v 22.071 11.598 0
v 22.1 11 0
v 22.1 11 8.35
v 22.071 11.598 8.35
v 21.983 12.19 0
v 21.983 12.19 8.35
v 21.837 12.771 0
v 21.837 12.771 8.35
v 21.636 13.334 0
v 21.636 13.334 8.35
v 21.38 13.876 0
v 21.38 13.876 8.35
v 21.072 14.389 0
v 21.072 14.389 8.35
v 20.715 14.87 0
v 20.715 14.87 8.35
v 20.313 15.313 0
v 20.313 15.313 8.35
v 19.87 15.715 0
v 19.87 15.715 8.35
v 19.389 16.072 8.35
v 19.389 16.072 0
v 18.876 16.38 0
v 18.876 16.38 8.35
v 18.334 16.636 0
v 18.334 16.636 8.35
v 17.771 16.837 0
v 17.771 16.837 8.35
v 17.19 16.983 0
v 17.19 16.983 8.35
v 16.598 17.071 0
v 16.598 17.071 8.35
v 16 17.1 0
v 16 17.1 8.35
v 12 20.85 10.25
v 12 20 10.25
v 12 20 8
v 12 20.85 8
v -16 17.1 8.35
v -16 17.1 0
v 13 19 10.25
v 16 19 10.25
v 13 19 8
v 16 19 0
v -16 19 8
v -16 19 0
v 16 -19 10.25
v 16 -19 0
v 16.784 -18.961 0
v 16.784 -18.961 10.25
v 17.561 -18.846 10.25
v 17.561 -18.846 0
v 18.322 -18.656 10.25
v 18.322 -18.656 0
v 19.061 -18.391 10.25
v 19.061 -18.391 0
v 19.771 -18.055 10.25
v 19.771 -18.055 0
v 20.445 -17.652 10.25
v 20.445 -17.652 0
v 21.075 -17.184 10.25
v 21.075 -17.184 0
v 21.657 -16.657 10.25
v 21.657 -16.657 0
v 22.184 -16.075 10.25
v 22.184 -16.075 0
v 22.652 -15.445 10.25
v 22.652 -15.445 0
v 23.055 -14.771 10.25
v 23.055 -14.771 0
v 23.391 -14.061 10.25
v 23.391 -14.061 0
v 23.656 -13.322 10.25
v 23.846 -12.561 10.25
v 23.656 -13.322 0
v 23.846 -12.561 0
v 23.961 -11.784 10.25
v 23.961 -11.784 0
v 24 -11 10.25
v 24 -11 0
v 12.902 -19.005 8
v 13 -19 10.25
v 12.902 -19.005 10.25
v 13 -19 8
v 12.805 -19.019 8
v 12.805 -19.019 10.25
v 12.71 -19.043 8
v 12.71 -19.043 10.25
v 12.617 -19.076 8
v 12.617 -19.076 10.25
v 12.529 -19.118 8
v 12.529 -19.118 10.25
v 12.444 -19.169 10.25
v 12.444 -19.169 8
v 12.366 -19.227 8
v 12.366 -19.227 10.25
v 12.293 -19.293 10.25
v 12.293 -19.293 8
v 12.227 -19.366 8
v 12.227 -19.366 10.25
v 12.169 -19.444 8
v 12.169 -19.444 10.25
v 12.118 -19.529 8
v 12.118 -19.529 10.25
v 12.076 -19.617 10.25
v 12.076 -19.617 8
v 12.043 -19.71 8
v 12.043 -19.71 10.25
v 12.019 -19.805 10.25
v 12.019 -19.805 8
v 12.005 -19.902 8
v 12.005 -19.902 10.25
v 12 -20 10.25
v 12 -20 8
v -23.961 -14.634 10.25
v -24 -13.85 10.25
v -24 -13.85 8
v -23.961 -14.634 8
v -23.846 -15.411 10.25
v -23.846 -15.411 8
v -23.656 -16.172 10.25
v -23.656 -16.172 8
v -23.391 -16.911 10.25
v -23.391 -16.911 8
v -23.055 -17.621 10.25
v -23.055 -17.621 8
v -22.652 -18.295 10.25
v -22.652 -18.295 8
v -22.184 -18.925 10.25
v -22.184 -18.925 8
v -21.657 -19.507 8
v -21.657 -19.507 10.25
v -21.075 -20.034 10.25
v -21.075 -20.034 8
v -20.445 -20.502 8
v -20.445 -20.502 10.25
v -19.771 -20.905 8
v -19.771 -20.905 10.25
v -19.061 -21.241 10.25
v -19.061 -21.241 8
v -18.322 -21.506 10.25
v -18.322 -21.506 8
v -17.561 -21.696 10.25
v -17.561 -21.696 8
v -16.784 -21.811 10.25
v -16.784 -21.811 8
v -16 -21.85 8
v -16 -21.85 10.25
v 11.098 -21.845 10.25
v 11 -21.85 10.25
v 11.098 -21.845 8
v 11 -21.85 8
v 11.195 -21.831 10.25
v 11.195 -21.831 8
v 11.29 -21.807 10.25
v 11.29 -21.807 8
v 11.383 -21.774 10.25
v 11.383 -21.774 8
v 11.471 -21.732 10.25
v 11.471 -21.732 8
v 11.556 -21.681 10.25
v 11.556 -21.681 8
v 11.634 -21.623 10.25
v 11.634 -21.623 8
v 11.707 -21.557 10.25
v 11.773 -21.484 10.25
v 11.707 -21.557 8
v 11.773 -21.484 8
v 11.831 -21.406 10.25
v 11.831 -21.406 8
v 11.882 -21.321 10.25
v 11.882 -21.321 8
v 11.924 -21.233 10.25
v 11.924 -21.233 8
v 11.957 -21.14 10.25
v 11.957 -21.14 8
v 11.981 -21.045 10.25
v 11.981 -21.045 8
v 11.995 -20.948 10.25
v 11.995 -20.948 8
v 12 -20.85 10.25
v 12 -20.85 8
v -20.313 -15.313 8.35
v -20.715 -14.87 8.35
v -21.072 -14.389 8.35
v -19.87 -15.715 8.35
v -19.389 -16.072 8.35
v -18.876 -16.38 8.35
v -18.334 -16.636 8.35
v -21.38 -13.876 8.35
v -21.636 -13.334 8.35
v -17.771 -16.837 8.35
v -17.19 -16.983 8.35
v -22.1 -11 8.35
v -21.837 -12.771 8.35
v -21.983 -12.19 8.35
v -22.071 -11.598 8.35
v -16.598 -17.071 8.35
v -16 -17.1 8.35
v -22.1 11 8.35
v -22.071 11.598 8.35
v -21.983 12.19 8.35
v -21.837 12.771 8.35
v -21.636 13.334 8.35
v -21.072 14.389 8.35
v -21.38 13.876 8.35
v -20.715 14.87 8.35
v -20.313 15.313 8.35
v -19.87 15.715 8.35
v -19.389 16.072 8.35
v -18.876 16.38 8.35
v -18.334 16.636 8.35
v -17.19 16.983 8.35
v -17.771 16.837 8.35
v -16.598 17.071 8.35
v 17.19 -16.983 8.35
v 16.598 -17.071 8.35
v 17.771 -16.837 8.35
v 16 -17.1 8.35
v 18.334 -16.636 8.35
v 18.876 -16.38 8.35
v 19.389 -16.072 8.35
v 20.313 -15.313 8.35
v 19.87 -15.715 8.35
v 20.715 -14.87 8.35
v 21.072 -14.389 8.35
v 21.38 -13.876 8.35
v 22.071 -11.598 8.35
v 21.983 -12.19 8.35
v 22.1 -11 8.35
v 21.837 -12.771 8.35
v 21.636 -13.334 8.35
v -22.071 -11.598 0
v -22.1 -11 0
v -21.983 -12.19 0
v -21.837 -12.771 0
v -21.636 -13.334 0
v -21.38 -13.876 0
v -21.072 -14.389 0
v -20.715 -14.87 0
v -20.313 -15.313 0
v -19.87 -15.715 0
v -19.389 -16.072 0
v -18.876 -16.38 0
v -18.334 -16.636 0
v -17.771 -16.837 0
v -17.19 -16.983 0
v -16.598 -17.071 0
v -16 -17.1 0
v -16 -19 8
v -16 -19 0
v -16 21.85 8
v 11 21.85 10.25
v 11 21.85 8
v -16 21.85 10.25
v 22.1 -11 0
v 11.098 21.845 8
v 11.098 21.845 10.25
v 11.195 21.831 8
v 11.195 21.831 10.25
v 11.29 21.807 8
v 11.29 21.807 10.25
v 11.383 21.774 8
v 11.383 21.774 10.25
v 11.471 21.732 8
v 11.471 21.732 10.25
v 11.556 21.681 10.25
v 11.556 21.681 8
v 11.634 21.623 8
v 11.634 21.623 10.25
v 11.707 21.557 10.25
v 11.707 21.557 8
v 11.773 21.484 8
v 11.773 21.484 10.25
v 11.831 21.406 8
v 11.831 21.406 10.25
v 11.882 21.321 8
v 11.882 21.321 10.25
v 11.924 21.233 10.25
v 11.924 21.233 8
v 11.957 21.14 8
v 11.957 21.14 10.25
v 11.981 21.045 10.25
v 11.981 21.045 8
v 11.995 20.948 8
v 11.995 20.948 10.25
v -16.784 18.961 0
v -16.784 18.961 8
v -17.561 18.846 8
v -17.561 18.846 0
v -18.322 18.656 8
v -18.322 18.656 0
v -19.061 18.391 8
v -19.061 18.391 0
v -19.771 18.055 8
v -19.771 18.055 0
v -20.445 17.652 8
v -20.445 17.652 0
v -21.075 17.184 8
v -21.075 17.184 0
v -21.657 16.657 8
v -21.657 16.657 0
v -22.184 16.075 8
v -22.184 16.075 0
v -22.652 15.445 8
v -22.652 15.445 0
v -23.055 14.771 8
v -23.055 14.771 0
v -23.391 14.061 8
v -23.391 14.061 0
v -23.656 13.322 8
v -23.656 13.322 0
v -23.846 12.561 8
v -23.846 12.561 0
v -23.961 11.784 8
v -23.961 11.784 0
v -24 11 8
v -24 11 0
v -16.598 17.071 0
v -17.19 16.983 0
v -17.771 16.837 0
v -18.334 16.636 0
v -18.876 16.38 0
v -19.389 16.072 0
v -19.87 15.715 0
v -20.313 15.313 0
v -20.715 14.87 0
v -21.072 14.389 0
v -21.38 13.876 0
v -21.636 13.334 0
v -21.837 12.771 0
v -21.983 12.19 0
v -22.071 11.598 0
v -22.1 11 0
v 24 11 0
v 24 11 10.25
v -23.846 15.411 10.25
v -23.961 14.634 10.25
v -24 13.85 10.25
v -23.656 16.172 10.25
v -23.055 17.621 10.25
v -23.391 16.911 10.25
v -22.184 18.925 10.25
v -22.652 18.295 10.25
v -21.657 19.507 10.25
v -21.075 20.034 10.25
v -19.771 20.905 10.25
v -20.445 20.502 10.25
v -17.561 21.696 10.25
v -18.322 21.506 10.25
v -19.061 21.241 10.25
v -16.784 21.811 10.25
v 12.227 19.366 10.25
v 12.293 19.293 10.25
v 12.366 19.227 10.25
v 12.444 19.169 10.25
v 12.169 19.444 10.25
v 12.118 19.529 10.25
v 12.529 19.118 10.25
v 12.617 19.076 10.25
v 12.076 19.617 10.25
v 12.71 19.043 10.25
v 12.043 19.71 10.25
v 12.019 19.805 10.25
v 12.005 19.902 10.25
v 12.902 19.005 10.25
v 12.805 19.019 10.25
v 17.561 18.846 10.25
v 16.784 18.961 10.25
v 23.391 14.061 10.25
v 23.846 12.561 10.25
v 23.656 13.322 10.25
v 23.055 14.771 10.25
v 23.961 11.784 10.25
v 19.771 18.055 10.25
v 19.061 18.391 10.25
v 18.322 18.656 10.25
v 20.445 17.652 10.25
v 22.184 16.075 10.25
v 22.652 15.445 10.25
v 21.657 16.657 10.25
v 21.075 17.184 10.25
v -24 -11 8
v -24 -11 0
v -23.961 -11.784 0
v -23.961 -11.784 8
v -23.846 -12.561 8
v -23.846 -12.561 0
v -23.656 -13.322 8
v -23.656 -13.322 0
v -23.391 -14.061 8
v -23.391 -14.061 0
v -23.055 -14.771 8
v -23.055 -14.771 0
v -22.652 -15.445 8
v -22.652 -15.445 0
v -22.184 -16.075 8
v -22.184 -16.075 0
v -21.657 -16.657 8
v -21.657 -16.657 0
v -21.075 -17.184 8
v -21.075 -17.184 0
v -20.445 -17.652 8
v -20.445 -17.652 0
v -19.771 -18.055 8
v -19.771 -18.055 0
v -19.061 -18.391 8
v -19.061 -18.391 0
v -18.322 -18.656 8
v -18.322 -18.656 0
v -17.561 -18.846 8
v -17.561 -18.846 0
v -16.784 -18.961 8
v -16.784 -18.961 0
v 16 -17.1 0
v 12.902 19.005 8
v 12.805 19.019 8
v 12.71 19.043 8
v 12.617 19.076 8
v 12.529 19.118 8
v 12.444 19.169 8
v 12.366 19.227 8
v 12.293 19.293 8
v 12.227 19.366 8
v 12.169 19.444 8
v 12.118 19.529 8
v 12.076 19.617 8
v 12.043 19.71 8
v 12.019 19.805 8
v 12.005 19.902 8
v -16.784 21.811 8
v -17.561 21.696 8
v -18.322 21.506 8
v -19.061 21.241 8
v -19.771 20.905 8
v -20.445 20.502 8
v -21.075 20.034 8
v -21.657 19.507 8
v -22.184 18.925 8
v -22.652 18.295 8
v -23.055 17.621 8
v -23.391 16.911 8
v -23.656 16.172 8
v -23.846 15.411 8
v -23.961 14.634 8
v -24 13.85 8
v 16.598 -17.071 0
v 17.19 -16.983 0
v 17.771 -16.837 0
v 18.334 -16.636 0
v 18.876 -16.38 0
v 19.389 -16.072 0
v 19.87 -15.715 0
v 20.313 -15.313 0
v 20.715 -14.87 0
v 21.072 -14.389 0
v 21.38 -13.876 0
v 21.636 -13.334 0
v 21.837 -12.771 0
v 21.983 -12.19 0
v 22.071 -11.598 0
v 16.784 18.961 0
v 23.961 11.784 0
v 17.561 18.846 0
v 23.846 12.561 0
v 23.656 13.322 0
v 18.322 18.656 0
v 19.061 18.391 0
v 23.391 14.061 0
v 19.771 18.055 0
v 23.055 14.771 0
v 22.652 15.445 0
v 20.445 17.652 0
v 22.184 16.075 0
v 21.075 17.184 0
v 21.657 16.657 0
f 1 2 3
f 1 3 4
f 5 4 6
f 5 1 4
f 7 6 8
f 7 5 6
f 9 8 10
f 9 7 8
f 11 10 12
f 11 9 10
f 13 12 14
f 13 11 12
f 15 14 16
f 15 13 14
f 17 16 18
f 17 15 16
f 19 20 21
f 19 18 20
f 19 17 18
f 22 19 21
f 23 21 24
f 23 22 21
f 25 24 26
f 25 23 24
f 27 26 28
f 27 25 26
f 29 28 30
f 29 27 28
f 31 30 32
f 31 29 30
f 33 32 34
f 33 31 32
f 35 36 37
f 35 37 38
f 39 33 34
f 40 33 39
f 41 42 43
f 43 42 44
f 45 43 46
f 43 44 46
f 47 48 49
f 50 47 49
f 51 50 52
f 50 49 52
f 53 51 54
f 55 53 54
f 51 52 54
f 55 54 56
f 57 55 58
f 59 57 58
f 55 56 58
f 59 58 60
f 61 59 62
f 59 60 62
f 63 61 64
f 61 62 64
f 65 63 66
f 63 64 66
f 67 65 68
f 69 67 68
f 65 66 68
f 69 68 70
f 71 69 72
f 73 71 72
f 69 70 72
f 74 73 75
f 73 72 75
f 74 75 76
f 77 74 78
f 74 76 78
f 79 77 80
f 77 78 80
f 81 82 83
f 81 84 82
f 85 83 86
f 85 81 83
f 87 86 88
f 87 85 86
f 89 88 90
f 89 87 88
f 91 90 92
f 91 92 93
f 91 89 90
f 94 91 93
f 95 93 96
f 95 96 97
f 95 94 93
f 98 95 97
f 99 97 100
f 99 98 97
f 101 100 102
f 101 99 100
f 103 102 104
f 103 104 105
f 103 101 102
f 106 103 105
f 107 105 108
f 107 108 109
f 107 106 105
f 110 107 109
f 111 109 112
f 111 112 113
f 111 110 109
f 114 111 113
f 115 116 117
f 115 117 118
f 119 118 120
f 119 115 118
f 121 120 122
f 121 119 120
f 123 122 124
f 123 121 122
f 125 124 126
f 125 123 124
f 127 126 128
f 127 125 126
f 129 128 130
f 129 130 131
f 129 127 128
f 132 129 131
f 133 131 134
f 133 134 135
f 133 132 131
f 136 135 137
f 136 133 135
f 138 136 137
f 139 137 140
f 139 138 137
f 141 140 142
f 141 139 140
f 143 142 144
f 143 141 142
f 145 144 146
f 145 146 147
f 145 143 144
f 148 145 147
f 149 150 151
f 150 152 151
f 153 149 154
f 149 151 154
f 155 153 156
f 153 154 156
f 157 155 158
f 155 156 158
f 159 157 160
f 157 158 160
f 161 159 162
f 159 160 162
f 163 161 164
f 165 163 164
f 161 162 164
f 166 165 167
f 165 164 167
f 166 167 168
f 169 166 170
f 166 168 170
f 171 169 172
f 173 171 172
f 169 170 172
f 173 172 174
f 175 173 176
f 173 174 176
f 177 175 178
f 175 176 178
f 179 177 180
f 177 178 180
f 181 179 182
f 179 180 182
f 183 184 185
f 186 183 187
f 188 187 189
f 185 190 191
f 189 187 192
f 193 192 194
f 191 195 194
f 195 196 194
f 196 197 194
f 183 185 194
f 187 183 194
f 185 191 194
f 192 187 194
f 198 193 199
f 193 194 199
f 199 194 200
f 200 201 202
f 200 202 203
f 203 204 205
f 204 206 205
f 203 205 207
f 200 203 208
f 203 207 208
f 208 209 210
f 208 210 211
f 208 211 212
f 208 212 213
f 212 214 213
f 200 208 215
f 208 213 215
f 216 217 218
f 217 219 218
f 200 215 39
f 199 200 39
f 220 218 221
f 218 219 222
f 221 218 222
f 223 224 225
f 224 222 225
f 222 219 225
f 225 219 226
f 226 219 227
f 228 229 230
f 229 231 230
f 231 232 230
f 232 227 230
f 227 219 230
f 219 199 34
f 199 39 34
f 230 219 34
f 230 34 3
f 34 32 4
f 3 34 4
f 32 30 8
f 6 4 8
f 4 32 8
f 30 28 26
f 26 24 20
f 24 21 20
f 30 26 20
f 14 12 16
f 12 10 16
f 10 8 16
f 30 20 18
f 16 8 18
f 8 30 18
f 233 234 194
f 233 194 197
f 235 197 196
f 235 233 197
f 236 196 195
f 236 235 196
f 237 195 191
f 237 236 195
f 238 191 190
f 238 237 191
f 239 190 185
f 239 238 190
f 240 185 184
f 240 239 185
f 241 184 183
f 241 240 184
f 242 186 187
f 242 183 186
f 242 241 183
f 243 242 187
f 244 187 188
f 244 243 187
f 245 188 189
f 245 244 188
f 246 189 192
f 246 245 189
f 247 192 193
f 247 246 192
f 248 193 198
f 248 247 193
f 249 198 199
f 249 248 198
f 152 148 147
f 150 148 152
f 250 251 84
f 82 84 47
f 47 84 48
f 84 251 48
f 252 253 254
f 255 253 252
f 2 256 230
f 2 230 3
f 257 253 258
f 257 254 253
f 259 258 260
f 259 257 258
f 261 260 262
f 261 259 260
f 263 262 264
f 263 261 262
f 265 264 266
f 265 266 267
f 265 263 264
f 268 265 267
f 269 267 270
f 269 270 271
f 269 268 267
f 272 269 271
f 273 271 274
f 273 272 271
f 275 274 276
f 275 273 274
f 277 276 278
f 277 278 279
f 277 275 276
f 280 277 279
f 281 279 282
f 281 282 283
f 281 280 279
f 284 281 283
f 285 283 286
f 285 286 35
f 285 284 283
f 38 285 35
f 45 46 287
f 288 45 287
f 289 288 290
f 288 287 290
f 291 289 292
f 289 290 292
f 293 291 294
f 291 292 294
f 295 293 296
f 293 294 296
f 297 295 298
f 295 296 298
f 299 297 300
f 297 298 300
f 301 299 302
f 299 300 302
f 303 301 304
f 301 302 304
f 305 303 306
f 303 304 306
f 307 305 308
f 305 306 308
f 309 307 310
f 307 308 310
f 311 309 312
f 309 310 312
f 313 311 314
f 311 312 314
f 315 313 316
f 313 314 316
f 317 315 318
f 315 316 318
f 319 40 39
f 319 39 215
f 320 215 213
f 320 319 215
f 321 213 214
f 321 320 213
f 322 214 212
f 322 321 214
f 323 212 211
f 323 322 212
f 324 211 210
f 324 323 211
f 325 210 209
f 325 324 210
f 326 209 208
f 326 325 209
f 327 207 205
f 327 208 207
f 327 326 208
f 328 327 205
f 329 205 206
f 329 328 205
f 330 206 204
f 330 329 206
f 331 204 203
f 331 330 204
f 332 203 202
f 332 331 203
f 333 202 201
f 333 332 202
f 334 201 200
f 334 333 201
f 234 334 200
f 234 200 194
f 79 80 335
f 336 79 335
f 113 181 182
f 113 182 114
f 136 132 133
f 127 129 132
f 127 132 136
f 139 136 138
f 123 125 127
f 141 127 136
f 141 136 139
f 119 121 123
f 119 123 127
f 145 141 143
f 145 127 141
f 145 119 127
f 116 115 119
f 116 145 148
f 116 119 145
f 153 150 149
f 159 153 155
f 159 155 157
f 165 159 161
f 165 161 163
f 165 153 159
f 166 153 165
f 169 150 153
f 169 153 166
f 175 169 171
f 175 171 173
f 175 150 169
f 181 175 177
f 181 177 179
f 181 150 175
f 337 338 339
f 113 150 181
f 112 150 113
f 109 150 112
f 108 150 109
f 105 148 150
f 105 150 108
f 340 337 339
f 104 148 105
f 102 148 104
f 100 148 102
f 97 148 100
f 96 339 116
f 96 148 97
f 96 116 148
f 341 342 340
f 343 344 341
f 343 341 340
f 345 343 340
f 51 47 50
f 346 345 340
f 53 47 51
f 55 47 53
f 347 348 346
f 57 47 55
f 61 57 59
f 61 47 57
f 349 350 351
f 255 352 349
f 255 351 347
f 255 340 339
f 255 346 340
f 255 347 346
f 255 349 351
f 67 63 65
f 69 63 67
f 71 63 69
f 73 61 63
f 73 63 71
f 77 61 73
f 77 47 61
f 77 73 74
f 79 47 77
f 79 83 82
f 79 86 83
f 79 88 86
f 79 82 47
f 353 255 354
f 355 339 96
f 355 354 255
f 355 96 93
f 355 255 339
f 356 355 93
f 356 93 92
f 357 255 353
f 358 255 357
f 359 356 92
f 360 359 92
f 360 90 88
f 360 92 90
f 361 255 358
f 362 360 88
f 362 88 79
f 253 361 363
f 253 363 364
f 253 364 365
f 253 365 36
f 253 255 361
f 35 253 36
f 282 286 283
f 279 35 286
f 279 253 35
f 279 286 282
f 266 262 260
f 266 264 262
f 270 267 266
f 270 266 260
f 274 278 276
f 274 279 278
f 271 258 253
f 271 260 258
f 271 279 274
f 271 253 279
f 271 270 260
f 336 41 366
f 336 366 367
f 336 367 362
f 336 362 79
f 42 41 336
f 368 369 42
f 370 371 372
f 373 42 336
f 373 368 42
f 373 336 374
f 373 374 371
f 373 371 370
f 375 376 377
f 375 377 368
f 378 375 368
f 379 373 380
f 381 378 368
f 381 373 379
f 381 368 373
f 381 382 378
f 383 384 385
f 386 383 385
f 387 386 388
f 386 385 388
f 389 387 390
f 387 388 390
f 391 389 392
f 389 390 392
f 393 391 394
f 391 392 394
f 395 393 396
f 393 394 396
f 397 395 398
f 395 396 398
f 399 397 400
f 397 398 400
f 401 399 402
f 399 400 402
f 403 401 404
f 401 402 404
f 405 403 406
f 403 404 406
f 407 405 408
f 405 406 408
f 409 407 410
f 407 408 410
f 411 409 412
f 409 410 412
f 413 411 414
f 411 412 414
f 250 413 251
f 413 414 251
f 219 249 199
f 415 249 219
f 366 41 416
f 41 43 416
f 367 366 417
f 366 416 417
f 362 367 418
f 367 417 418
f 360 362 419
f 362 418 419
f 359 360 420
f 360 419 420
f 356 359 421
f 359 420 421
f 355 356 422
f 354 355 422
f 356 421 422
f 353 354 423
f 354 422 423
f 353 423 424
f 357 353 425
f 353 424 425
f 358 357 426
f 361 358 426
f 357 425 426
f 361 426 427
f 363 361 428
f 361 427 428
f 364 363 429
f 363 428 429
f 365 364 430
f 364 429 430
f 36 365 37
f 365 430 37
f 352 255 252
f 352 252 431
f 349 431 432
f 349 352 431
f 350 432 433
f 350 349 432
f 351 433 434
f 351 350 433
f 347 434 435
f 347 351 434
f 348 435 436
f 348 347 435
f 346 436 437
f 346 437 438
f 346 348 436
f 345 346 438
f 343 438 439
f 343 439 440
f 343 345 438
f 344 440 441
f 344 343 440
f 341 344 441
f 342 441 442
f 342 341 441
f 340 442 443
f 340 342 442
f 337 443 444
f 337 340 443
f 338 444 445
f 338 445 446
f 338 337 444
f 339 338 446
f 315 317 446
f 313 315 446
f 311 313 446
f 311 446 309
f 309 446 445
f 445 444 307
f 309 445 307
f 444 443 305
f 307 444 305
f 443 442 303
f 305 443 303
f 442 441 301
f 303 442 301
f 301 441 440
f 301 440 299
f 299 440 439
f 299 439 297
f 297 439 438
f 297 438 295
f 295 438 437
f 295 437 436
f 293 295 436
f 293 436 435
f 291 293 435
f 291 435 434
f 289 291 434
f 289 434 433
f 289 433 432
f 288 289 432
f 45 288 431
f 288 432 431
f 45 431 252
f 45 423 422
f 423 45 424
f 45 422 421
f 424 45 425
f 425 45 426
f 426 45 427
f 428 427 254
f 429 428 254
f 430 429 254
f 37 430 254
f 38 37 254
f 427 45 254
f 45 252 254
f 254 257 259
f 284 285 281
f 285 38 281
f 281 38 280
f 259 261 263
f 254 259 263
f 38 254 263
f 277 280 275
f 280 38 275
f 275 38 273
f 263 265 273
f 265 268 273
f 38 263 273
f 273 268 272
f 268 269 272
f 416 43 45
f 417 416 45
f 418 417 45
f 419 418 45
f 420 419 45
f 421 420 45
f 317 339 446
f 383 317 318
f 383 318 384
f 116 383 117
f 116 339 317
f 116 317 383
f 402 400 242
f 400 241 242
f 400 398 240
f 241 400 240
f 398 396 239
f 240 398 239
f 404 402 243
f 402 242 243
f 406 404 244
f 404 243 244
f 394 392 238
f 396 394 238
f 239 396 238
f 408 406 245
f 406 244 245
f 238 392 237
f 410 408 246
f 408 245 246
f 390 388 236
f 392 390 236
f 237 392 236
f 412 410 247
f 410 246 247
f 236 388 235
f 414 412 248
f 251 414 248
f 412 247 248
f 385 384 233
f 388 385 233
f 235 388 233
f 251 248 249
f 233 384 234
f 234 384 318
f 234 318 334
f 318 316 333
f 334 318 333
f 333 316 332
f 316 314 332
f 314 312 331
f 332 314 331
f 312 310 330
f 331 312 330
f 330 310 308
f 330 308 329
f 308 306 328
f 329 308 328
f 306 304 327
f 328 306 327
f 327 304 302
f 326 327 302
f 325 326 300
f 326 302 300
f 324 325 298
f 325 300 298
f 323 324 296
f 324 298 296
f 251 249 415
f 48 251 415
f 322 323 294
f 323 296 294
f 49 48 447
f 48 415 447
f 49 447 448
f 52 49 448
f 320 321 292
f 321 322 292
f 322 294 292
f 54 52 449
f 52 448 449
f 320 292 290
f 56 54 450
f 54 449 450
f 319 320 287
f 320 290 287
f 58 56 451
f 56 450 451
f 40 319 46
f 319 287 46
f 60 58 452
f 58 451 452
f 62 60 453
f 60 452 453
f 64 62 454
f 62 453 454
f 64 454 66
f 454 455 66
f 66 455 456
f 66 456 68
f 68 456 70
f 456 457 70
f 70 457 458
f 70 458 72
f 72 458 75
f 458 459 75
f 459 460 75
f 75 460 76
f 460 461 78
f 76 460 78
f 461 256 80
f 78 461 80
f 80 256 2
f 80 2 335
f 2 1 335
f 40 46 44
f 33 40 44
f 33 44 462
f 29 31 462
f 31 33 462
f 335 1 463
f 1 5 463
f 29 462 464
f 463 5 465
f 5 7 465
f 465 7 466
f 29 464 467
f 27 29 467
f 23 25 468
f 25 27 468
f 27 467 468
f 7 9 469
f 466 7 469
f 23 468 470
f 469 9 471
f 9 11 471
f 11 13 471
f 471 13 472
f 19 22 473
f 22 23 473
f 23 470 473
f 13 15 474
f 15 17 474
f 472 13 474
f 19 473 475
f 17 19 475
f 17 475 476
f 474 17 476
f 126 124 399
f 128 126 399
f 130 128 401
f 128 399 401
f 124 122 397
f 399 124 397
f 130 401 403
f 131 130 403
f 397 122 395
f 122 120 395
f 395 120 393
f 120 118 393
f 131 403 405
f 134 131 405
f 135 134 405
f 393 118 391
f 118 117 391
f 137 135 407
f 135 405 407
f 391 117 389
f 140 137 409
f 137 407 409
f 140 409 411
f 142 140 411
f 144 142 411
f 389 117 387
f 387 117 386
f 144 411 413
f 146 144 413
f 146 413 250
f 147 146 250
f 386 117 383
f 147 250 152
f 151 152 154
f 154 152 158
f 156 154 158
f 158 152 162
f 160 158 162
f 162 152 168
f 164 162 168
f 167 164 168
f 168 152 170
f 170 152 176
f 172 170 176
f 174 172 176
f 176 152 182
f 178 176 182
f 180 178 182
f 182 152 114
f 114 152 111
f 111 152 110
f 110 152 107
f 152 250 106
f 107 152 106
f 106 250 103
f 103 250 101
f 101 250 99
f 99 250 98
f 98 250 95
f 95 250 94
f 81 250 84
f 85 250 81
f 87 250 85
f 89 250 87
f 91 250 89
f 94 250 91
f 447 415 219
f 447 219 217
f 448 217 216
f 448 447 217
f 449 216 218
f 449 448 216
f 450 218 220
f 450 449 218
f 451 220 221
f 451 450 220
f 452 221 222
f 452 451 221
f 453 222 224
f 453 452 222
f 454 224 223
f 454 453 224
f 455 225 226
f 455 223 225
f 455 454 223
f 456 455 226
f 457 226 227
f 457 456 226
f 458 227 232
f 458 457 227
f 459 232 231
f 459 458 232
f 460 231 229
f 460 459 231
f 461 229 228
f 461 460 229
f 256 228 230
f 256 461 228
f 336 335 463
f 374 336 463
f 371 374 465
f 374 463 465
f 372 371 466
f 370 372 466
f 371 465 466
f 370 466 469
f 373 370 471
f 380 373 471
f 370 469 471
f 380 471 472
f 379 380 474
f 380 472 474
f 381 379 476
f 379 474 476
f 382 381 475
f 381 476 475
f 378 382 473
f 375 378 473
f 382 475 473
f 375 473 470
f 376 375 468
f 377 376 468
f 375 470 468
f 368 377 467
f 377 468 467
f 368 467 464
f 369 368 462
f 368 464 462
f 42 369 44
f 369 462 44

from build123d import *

# Parameters (mm, degrees)
F1_DEPTH = 10.25
F2_T     = -1.9
F4_DEPTH = 2.25
F5_R     = 1


with BuildPart() as f1:
    # F0 (on Top) → F1 (new body)
    with BuildSketch(Plane.XY):
        with BuildLine():
            Line((16, 19), (-16, 19))
            ThreePointArc((-16, 19), (-21.6568542495, 16.6568542495), (-24, 11))
            Line((-24, 11), (-24, -11))
            ThreePointArc((-24, -11), (-21.6568542495, -16.6568542495), (-16, -19))
            Line((-16, -19), (16, -19))
            ThreePointArc((16, -19), (21.6568542495, -16.6568542495), (24, -11))
            Line((24, -11), (24, 11))
            ThreePointArc((24, 11), (21.6568542495, 16.6568542495), (16, 19))
        make_face()
    extrude(amount=F1_DEPTH)

    # F2
    f2_openings = [f1.faces().sort_by_distance(p)[0] for p in [
        (0, 0, 0),
    ]]
    offset(amount=F2_T, openings=f2_openings)

    # F3 (on face) → F4 (join)
    with BuildSketch(Plane.XY.offset(10.25)):
        with BuildLine():
            Line((12, 21.85), (-16, 21.85))
            ThreePointArc((-16, 21.85), (-21.6568542495, 19.5068542495), (-24, 13.85))
            Line((-24, 13.85), (-24, 11))
            ThreePointArc((-24, 11), (-21.6568542495, 16.6568542495), (-16, 19))
            Line((-16, 19), (12, 19))
            Line((12, 19), (12, 21.85))
        make_face()
        with BuildLine():
            Line((12, -21.85), (12, -19))
            Line((12, -19), (-16, -19))
            ThreePointArc((-16, -19), (-21.6568542495, -16.6568542495), (-24, -11))
            Line((-24, -11), (-24, -13.85))
            ThreePointArc((-24, -13.85), (-21.6568542495, -19.5068542495), (-16, -21.85))
            Line((-16, -21.85), (12, -21.85))
        make_face()
    extrude(amount=-F4_DEPTH)

    # F5
    f5_edges = [f1.edges().sort_by_distance(p)[0] for p in [
        (12, 19, 9.125),
        (12, 21.85, 9.125),
        (12, -19, 9.125),
        (12, -21.85, 9.125),
    ]]
    fillet(f5_edges, radius=F5_R)


solid = f1.part
